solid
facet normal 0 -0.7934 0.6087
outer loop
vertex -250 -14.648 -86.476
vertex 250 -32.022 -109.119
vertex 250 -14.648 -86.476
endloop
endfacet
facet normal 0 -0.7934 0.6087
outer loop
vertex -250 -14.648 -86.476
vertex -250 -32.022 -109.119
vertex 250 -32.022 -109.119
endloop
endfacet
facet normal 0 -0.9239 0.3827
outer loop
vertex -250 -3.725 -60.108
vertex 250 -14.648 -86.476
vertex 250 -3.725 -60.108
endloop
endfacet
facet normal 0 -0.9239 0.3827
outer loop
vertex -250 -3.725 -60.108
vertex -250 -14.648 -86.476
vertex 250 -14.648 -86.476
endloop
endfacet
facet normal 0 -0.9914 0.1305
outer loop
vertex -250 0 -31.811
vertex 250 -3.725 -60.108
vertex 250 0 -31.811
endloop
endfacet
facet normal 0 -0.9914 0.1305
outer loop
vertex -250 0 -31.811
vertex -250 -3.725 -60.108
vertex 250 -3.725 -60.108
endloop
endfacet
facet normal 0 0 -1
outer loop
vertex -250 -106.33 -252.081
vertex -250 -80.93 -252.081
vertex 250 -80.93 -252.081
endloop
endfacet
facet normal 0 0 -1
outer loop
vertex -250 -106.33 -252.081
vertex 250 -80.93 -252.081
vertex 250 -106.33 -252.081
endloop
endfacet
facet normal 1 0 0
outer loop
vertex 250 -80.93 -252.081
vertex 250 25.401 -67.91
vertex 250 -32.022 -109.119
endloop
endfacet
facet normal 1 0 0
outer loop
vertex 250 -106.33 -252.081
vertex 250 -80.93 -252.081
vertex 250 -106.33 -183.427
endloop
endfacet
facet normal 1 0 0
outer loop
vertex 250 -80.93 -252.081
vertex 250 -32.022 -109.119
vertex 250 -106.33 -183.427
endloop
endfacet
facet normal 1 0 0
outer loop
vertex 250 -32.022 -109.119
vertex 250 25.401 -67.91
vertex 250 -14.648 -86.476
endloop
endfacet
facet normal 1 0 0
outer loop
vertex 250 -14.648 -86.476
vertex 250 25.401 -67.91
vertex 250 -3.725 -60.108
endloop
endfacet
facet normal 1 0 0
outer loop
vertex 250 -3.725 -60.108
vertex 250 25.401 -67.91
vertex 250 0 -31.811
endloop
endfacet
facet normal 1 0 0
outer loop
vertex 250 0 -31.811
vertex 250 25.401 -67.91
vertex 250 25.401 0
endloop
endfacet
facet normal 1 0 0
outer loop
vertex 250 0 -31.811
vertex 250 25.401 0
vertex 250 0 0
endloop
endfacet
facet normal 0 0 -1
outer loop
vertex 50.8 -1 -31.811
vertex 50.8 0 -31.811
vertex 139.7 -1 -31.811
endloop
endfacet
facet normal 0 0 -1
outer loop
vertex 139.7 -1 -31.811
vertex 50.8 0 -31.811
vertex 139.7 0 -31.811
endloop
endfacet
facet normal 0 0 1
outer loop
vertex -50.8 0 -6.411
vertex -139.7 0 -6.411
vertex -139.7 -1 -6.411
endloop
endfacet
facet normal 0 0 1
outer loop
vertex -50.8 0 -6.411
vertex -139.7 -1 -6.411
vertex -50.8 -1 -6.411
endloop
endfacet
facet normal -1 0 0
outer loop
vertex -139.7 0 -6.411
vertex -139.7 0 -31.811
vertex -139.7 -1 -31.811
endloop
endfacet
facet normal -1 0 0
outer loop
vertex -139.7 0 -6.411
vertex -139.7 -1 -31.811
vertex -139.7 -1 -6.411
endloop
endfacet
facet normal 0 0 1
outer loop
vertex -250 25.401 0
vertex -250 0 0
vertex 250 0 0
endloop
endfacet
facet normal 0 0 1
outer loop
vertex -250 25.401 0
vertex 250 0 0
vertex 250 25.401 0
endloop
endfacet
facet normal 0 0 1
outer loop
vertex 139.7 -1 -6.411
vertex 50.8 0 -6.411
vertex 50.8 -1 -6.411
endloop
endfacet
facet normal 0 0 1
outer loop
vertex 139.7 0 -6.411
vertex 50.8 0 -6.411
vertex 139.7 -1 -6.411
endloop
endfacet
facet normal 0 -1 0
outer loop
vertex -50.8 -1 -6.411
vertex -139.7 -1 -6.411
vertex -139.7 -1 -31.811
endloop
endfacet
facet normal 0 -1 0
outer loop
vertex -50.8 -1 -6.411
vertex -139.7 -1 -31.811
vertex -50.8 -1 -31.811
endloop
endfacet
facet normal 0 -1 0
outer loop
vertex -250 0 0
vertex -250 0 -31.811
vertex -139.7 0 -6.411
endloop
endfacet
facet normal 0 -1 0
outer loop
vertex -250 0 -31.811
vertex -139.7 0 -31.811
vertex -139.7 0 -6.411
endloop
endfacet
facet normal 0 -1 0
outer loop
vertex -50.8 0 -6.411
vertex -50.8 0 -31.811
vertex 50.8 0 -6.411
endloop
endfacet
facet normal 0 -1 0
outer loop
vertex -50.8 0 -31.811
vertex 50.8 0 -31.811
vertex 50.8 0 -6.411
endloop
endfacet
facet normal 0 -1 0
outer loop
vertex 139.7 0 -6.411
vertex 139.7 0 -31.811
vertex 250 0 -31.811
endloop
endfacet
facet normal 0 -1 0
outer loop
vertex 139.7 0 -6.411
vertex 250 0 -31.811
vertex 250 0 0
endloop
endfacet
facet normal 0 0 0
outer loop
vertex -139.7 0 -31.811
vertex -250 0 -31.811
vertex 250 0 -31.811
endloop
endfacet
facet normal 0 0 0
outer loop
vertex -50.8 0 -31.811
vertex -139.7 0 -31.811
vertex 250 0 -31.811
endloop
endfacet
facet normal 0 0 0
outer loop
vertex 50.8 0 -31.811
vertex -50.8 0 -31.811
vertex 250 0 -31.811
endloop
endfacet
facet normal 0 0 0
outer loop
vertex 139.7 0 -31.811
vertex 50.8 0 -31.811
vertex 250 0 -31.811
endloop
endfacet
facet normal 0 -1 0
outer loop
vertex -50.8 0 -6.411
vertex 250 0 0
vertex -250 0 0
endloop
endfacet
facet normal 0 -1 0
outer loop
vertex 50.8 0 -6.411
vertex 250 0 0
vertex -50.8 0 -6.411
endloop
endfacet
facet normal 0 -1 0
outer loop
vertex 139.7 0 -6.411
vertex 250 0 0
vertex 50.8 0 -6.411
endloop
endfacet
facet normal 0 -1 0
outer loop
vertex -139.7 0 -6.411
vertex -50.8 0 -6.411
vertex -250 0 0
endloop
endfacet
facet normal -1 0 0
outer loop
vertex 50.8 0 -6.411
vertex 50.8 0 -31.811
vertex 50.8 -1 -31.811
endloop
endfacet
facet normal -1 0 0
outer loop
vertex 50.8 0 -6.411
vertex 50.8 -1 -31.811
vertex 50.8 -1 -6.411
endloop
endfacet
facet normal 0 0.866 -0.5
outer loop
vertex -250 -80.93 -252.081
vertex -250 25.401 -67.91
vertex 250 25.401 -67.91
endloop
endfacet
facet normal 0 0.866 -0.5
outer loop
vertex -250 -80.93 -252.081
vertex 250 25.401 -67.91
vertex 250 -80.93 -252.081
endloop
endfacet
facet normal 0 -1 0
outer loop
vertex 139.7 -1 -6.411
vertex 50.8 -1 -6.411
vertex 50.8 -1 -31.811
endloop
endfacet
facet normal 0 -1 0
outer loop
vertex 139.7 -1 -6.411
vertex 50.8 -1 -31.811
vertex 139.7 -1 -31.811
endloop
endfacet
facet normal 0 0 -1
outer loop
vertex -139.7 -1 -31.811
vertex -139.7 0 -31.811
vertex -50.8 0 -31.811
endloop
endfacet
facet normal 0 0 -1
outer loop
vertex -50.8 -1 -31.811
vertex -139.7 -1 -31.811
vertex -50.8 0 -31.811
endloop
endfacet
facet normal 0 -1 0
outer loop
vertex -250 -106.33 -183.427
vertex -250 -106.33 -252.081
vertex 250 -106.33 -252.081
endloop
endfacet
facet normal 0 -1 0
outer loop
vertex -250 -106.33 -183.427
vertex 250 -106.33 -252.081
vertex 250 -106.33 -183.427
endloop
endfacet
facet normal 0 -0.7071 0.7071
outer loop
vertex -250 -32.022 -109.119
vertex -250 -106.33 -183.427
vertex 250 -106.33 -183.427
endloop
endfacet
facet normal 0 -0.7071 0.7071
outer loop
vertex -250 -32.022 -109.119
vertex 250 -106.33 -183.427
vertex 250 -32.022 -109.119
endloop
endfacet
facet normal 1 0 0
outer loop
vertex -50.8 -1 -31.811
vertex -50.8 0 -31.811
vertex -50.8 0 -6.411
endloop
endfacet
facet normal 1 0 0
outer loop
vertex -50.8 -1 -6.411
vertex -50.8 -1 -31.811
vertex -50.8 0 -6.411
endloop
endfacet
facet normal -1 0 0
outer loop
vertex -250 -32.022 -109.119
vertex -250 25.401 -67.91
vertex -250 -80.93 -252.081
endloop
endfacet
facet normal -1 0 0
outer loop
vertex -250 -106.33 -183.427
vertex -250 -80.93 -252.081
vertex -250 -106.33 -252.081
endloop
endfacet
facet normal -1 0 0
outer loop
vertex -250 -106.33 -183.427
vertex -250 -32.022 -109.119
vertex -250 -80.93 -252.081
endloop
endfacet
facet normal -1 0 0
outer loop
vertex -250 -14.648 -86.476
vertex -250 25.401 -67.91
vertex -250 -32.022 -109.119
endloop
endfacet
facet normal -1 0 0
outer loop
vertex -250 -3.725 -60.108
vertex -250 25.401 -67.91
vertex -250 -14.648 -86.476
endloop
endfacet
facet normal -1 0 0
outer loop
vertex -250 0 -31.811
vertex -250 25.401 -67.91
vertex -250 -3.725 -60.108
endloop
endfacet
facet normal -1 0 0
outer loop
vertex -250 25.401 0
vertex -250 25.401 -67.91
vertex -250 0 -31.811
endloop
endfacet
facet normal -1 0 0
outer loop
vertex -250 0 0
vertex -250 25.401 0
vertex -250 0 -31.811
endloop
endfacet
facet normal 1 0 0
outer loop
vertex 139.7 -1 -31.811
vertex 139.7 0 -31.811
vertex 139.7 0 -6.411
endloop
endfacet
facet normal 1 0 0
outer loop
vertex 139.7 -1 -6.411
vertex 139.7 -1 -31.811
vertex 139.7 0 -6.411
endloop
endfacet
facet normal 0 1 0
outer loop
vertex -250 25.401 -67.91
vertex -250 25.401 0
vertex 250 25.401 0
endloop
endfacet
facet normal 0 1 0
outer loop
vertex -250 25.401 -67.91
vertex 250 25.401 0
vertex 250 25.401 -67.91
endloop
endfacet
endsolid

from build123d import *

# Parameters (mm, degrees)
BOSS_EXTRUDE1_DEPTH = 500
CUT_EXTRUDE1_DEPTH  = 570.957034721
SKETCH3_W           = 88.9
SKETCH3_H           = 25.400000016
BOSS_EXTRUDE2_DEPTH = 1
SKETCH4_W           = 88.9
SKETCH4_H           = 25.40000001
BOSS_EXTRUDE3_DEPTH = 1
FILLET1_R           = 109.330995043


with BuildPart() as part:
    # Sketch1 → Boss-Extrude1 (new body)
    with BuildSketch(Plane(origin=(-250, 0, 0), x_dir=(0, -1, 0), z_dir=(-1, 0, 0))):
        Polygon((106.330251065, -252.08113602), (106.330251065, 0), (-25.401284991, 0), (-25.401284991, -67.909513139), (80.930251056, -252.08113602), align=None)
    extrude(amount=-BOSS_EXTRUDE1_DEPTH)

    # Sketch2 → Cut-Extrude1 (cut, through all)
    with BuildSketch(Plane(origin=(250, 0, 0), x_dir=(0, 0, -1), z_dir=(1, 0, 0))):
        Polygon((183.427309509, -106.33025104), (77.097058469, 0), (0, 0), (0, -106.33025104), align=None)
    extrude(amount=-CUT_EXTRUDE1_DEPTH, mode=Mode.SUBTRACT)

    # Sketch3 → Boss-Extrude2 (add)
    with BuildSketch(Plane.XZ):
        with Locations((-95.25, -19.110677533)):
            Rectangle(SKETCH3_W, SKETCH3_H)
    extrude(amount=BOSS_EXTRUDE2_DEPTH)

    # Sketch4 → Boss-Extrude3 (add)
    with BuildSketch(Plane.XZ):
        with Locations((95.25, -19.110677536)):
            Rectangle(SKETCH4_W, SKETCH4_H)
    extrude(amount=BOSS_EXTRUDE3_DEPTH)

    # Fillet1
    fillet1_edges = [part.edges().sort_by_distance(p)[0] for p in [
        (0, 0, -77.097058469),
    ]]
    fillet(fillet1_edges, radius=FILLET1_R - 0.0001)  # a hair under: the kernel refuses the full size


solid = part.part
